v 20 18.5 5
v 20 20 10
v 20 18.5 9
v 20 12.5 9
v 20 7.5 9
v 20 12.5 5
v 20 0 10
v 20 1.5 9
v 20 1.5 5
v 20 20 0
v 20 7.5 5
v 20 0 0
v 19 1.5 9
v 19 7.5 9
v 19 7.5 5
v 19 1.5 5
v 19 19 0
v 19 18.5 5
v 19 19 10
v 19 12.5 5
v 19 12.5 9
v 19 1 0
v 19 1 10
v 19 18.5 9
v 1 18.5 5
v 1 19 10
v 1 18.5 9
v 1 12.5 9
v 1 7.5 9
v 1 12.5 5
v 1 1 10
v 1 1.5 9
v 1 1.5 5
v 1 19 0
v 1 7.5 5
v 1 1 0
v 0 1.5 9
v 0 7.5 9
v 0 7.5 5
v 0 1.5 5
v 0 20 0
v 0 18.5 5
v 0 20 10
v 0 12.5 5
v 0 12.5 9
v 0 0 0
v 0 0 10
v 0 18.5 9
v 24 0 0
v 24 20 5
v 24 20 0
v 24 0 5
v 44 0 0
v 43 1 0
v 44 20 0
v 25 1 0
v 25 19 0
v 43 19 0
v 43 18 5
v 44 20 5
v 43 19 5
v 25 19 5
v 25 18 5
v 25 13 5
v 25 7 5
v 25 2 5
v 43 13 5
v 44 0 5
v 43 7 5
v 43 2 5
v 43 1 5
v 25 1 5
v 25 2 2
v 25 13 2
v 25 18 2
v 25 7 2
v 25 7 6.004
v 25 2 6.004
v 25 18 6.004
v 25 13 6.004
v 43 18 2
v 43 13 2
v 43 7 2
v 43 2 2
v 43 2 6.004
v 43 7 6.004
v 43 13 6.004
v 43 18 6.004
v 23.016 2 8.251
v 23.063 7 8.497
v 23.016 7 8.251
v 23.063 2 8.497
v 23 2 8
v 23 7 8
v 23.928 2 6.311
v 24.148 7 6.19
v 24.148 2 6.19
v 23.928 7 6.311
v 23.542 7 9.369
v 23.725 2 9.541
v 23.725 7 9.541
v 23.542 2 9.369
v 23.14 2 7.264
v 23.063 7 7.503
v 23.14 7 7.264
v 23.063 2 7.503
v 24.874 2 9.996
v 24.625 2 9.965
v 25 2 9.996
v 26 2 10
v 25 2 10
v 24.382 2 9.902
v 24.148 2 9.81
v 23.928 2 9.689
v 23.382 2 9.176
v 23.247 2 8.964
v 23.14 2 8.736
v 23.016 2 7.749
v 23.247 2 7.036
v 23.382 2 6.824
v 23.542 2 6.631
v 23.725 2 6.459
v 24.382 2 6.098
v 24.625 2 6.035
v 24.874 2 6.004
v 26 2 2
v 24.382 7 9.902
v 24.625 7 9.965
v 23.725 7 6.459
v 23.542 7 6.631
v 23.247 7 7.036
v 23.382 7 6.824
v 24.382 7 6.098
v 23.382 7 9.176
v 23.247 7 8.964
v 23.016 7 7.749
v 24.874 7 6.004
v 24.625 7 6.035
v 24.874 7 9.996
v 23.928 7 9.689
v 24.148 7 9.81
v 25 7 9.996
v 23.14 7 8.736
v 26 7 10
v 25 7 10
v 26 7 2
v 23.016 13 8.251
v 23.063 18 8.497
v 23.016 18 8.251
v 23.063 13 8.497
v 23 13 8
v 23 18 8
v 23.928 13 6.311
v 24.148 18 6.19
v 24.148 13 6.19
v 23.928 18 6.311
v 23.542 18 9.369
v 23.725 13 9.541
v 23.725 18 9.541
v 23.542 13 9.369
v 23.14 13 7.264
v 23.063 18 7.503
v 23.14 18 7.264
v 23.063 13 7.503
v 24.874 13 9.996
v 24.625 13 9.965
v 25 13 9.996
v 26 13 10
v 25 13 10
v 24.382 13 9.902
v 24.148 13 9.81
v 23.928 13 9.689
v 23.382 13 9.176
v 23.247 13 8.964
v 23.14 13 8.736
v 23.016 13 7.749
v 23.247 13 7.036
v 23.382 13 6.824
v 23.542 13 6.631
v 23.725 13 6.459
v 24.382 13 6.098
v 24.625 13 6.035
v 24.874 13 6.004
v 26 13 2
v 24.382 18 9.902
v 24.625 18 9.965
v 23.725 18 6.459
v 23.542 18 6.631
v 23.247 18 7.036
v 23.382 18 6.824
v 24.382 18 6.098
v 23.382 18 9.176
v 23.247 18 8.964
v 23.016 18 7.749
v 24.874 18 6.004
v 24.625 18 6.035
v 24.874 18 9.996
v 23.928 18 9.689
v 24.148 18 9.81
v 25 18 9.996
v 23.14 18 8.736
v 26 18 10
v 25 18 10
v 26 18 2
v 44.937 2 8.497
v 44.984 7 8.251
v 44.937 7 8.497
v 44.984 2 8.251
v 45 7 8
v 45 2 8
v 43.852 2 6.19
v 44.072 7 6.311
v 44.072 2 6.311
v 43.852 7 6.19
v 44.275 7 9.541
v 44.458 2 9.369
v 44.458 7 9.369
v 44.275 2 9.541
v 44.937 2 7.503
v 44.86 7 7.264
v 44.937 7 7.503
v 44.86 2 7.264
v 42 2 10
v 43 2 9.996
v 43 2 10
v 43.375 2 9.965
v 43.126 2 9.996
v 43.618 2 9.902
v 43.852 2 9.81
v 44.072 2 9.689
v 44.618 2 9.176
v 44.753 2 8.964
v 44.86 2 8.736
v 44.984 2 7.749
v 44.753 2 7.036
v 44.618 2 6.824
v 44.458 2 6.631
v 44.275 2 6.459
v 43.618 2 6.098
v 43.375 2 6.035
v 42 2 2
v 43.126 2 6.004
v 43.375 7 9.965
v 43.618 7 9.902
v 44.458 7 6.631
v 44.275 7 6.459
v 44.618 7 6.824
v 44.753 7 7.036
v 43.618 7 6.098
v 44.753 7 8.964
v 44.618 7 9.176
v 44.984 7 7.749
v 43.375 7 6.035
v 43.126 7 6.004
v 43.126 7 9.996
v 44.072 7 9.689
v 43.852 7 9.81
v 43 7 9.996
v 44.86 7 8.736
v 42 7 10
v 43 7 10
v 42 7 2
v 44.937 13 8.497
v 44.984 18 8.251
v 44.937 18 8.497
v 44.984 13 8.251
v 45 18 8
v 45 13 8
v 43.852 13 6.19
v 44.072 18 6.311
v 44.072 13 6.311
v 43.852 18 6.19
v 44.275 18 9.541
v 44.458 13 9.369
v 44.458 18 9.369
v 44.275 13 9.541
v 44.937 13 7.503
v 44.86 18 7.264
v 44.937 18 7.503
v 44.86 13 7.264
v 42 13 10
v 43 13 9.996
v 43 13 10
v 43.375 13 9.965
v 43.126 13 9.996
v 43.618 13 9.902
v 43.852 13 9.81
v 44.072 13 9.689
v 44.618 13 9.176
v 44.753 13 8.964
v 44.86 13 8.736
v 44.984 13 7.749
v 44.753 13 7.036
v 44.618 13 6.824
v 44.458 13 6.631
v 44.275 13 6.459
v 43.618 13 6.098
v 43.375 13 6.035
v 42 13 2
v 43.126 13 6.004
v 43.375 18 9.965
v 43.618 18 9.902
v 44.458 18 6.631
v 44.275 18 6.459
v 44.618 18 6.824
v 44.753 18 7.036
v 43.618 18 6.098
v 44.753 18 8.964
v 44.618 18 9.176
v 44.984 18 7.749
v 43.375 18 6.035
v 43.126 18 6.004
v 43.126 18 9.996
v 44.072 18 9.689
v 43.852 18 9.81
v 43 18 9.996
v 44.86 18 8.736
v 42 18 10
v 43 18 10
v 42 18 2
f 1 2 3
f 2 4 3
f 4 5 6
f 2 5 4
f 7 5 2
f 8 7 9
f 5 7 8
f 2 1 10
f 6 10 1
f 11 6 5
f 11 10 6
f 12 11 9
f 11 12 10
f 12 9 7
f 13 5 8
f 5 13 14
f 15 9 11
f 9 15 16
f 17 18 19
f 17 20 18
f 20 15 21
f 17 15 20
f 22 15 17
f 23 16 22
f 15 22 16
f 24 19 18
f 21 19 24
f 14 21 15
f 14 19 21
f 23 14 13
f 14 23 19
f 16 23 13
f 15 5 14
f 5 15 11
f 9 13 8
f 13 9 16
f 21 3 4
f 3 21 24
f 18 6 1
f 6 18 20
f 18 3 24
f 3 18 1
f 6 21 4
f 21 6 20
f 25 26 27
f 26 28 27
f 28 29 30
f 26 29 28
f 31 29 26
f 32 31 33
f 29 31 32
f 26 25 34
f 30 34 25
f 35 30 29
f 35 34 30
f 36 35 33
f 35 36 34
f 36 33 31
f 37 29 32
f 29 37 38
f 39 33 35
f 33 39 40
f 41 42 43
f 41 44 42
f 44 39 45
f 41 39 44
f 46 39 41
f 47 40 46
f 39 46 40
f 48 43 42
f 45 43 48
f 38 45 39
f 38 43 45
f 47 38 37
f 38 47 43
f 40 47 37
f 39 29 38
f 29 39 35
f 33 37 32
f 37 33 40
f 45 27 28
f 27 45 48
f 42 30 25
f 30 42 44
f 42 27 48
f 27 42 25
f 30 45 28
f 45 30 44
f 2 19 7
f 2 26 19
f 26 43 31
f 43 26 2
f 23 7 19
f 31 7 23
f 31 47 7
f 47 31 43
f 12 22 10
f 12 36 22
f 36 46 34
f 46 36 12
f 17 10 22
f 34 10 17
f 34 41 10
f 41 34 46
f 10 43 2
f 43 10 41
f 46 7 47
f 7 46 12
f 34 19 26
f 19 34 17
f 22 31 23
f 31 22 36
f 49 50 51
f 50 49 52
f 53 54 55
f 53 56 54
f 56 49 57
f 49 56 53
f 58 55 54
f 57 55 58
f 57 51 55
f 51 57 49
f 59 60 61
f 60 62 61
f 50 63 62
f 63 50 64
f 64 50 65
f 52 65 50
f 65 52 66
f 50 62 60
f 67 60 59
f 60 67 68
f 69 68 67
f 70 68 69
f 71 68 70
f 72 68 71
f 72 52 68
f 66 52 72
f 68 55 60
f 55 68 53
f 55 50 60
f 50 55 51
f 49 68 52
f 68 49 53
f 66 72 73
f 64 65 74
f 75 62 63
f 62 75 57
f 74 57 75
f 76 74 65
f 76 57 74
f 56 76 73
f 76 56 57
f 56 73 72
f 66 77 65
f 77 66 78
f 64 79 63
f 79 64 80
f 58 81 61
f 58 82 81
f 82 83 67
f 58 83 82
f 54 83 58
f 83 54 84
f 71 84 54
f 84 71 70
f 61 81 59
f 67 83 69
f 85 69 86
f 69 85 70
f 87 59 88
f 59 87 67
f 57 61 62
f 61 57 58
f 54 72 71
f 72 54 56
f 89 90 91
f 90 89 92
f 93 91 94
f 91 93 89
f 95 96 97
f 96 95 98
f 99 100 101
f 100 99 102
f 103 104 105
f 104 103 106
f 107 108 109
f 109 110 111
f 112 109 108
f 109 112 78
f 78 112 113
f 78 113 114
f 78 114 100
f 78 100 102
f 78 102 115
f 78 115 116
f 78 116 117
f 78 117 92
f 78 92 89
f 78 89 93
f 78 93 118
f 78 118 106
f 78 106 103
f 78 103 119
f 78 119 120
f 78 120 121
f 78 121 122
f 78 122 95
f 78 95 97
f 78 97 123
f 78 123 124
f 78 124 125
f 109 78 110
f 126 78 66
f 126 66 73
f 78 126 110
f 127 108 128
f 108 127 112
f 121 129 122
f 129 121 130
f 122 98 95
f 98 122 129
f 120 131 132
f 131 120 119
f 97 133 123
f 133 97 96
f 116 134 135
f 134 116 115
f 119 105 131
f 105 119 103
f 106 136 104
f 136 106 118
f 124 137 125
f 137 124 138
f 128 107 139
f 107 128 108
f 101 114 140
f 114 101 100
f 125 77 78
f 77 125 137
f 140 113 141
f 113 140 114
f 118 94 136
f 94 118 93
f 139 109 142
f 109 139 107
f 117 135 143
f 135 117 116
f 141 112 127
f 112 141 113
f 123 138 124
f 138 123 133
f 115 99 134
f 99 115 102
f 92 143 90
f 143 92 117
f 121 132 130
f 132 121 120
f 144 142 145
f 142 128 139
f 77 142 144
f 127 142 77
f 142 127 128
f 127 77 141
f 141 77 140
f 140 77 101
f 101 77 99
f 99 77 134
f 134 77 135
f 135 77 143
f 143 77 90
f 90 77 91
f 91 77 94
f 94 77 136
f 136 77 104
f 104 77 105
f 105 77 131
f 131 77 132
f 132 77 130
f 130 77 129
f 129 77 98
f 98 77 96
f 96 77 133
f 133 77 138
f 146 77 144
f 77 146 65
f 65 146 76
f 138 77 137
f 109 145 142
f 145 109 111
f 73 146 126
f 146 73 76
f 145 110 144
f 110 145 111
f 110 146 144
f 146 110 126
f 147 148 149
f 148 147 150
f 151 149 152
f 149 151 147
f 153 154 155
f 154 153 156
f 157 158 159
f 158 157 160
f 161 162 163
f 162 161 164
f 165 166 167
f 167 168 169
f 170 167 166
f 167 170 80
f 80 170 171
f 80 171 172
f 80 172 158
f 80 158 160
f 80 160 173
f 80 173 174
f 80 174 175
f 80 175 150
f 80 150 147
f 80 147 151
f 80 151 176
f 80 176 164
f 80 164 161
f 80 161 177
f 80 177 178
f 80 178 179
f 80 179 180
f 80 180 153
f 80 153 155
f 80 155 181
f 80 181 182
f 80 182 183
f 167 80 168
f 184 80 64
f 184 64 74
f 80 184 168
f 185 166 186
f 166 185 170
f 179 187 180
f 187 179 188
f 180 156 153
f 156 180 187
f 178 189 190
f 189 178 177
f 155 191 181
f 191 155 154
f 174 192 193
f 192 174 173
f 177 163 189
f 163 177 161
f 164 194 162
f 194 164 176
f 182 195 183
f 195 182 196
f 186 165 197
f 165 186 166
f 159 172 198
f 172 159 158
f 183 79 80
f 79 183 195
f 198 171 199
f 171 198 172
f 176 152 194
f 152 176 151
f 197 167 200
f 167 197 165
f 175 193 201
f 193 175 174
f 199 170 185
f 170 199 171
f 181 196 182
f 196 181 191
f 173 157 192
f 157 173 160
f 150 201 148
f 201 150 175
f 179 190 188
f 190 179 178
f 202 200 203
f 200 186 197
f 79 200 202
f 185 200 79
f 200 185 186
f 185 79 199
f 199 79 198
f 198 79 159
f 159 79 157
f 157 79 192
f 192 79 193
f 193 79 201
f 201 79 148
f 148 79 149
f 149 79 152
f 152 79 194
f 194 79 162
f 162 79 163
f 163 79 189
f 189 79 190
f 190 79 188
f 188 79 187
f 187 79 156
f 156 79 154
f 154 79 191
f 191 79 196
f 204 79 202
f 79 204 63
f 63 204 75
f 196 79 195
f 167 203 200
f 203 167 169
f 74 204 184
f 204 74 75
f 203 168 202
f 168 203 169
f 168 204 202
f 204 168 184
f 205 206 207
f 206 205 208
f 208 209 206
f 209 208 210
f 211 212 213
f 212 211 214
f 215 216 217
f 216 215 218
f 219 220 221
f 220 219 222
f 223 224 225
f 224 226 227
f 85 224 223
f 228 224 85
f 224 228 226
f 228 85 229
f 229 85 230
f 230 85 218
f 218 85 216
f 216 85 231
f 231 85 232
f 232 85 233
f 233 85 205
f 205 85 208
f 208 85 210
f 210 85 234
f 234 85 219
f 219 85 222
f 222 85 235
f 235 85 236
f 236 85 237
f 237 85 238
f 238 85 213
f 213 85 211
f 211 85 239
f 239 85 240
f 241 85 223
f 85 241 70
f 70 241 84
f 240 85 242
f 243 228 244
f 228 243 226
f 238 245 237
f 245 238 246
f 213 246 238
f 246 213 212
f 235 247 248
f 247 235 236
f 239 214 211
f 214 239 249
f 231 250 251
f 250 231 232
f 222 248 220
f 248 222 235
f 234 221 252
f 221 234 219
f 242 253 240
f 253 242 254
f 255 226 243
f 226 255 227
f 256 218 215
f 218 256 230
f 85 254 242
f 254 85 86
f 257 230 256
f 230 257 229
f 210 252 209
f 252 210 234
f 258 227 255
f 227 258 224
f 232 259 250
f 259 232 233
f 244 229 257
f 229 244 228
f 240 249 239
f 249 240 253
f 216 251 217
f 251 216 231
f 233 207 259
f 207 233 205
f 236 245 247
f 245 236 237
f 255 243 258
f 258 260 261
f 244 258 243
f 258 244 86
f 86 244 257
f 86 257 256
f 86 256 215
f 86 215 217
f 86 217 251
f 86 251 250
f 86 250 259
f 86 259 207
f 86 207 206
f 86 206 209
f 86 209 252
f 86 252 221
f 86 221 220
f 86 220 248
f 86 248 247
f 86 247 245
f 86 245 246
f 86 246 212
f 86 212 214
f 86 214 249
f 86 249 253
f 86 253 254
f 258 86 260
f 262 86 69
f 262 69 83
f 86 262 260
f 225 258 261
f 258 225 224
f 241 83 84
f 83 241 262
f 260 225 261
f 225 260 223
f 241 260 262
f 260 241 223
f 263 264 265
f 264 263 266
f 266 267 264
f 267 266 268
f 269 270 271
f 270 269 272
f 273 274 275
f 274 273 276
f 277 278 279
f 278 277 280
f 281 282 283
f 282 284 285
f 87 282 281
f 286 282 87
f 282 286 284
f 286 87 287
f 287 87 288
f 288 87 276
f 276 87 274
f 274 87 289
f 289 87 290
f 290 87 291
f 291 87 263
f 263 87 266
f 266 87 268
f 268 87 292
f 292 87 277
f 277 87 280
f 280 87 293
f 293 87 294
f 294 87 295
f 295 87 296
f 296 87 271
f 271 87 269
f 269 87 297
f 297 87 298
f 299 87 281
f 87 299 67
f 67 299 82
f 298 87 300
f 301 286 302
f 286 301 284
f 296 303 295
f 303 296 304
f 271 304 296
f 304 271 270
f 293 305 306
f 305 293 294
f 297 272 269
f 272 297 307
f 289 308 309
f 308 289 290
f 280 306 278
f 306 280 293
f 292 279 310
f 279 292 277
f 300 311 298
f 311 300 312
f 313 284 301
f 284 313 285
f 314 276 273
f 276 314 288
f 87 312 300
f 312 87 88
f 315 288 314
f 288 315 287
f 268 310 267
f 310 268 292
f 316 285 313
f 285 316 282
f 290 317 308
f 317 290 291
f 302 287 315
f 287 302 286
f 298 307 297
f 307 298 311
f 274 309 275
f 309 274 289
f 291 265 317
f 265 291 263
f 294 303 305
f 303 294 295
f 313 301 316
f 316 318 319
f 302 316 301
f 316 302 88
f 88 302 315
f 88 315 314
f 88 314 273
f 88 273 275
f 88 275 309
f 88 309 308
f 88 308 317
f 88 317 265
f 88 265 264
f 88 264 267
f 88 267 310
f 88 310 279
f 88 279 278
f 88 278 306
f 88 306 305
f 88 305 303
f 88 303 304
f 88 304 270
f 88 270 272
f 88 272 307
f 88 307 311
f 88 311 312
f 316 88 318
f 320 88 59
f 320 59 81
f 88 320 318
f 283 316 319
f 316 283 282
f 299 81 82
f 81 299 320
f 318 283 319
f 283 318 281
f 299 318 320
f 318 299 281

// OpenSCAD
// parameters
X = 20;
Y = 20;
Z_BOX = 10;
Z_CAP = 5;
THICKNESS = 1;

module SnapHook(x, y, z_box, z_cap, thickness) {
    module SH_Hook(w, h) {
        // half circle
        translate([-w/2+1, 0, 0]) {
            difference() {
                rotate([-90, 0, 0])
                    translate([w/2, -w/2, 0])
                        cylinder(r=w/2, h=h, $fn=50);
                translate([-w/2, 0, 0])
                    cube([w, h, w]);
            }
        }

        // arm
        cube([1, h, 2*w]);
    }

    // box
    difference() {
        cube([x, y, z_box]);
        translate([thickness, thickness, 0])
            cube([x-2*thickness, y-2*thickness, z_box]);

        // holes
        translate([0, 0, z_box]) {
            translate([x-thickness, thickness+1-0.5, -x/4])
                cube([thickness, x/4+1, 4*thickness]);
            translate([x-thickness, y-(thickness+1+x/4)-0.5, -x/4])
                cube([thickness, x/4+1, 4*thickness]);

            translate([0, thickness+1-0.5, -x/4])
                cube([thickness, x/4+1, 4*thickness]);
            translate([0, y-(thickness+1+x/4)-0.5, -x/4])
                cube([thickness, x/4+1, 4*thickness]);
        }
    }

    // cap
    // for printing -----------------------------------------------------
    rotate([0, 180, 0])
        translate([-2*x-4*thickness, 0, -z_box-z_cap]) {
    // ------------------------------------------------------------------
    translate([0, 0, z_box]) {
        difference() {
            cube([x, y, z_cap]);
            translate([thickness, thickness, 0])
                cube([x-2*thickness, y-2*thickness, z_cap]);
        }

        // hook
        translate([x-thickness-1, thickness+1, -x/4])
            SH_Hook(4*thickness, x/4);
        translate([x-thickness-1, y-(thickness+1+x/4), -x/4])
            SH_Hook(4*thickness, x/4);
        mirror([1, 0, 0]) {
            translate([-thickness-1, thickness+1, -x/4])
                SH_Hook(4*thickness, x/4);
            translate([-thickness-1, y-(thickness+1+x/4), -x/4])
                SH_Hook(4*thickness, x/4);
        }
    }
    // for printing -----------------------------------------------------
    }
    // ------------------------------------------------------------------
}

// main
SnapHook(X, Y, Z_BOX, Z_CAP, THICKNESS);
